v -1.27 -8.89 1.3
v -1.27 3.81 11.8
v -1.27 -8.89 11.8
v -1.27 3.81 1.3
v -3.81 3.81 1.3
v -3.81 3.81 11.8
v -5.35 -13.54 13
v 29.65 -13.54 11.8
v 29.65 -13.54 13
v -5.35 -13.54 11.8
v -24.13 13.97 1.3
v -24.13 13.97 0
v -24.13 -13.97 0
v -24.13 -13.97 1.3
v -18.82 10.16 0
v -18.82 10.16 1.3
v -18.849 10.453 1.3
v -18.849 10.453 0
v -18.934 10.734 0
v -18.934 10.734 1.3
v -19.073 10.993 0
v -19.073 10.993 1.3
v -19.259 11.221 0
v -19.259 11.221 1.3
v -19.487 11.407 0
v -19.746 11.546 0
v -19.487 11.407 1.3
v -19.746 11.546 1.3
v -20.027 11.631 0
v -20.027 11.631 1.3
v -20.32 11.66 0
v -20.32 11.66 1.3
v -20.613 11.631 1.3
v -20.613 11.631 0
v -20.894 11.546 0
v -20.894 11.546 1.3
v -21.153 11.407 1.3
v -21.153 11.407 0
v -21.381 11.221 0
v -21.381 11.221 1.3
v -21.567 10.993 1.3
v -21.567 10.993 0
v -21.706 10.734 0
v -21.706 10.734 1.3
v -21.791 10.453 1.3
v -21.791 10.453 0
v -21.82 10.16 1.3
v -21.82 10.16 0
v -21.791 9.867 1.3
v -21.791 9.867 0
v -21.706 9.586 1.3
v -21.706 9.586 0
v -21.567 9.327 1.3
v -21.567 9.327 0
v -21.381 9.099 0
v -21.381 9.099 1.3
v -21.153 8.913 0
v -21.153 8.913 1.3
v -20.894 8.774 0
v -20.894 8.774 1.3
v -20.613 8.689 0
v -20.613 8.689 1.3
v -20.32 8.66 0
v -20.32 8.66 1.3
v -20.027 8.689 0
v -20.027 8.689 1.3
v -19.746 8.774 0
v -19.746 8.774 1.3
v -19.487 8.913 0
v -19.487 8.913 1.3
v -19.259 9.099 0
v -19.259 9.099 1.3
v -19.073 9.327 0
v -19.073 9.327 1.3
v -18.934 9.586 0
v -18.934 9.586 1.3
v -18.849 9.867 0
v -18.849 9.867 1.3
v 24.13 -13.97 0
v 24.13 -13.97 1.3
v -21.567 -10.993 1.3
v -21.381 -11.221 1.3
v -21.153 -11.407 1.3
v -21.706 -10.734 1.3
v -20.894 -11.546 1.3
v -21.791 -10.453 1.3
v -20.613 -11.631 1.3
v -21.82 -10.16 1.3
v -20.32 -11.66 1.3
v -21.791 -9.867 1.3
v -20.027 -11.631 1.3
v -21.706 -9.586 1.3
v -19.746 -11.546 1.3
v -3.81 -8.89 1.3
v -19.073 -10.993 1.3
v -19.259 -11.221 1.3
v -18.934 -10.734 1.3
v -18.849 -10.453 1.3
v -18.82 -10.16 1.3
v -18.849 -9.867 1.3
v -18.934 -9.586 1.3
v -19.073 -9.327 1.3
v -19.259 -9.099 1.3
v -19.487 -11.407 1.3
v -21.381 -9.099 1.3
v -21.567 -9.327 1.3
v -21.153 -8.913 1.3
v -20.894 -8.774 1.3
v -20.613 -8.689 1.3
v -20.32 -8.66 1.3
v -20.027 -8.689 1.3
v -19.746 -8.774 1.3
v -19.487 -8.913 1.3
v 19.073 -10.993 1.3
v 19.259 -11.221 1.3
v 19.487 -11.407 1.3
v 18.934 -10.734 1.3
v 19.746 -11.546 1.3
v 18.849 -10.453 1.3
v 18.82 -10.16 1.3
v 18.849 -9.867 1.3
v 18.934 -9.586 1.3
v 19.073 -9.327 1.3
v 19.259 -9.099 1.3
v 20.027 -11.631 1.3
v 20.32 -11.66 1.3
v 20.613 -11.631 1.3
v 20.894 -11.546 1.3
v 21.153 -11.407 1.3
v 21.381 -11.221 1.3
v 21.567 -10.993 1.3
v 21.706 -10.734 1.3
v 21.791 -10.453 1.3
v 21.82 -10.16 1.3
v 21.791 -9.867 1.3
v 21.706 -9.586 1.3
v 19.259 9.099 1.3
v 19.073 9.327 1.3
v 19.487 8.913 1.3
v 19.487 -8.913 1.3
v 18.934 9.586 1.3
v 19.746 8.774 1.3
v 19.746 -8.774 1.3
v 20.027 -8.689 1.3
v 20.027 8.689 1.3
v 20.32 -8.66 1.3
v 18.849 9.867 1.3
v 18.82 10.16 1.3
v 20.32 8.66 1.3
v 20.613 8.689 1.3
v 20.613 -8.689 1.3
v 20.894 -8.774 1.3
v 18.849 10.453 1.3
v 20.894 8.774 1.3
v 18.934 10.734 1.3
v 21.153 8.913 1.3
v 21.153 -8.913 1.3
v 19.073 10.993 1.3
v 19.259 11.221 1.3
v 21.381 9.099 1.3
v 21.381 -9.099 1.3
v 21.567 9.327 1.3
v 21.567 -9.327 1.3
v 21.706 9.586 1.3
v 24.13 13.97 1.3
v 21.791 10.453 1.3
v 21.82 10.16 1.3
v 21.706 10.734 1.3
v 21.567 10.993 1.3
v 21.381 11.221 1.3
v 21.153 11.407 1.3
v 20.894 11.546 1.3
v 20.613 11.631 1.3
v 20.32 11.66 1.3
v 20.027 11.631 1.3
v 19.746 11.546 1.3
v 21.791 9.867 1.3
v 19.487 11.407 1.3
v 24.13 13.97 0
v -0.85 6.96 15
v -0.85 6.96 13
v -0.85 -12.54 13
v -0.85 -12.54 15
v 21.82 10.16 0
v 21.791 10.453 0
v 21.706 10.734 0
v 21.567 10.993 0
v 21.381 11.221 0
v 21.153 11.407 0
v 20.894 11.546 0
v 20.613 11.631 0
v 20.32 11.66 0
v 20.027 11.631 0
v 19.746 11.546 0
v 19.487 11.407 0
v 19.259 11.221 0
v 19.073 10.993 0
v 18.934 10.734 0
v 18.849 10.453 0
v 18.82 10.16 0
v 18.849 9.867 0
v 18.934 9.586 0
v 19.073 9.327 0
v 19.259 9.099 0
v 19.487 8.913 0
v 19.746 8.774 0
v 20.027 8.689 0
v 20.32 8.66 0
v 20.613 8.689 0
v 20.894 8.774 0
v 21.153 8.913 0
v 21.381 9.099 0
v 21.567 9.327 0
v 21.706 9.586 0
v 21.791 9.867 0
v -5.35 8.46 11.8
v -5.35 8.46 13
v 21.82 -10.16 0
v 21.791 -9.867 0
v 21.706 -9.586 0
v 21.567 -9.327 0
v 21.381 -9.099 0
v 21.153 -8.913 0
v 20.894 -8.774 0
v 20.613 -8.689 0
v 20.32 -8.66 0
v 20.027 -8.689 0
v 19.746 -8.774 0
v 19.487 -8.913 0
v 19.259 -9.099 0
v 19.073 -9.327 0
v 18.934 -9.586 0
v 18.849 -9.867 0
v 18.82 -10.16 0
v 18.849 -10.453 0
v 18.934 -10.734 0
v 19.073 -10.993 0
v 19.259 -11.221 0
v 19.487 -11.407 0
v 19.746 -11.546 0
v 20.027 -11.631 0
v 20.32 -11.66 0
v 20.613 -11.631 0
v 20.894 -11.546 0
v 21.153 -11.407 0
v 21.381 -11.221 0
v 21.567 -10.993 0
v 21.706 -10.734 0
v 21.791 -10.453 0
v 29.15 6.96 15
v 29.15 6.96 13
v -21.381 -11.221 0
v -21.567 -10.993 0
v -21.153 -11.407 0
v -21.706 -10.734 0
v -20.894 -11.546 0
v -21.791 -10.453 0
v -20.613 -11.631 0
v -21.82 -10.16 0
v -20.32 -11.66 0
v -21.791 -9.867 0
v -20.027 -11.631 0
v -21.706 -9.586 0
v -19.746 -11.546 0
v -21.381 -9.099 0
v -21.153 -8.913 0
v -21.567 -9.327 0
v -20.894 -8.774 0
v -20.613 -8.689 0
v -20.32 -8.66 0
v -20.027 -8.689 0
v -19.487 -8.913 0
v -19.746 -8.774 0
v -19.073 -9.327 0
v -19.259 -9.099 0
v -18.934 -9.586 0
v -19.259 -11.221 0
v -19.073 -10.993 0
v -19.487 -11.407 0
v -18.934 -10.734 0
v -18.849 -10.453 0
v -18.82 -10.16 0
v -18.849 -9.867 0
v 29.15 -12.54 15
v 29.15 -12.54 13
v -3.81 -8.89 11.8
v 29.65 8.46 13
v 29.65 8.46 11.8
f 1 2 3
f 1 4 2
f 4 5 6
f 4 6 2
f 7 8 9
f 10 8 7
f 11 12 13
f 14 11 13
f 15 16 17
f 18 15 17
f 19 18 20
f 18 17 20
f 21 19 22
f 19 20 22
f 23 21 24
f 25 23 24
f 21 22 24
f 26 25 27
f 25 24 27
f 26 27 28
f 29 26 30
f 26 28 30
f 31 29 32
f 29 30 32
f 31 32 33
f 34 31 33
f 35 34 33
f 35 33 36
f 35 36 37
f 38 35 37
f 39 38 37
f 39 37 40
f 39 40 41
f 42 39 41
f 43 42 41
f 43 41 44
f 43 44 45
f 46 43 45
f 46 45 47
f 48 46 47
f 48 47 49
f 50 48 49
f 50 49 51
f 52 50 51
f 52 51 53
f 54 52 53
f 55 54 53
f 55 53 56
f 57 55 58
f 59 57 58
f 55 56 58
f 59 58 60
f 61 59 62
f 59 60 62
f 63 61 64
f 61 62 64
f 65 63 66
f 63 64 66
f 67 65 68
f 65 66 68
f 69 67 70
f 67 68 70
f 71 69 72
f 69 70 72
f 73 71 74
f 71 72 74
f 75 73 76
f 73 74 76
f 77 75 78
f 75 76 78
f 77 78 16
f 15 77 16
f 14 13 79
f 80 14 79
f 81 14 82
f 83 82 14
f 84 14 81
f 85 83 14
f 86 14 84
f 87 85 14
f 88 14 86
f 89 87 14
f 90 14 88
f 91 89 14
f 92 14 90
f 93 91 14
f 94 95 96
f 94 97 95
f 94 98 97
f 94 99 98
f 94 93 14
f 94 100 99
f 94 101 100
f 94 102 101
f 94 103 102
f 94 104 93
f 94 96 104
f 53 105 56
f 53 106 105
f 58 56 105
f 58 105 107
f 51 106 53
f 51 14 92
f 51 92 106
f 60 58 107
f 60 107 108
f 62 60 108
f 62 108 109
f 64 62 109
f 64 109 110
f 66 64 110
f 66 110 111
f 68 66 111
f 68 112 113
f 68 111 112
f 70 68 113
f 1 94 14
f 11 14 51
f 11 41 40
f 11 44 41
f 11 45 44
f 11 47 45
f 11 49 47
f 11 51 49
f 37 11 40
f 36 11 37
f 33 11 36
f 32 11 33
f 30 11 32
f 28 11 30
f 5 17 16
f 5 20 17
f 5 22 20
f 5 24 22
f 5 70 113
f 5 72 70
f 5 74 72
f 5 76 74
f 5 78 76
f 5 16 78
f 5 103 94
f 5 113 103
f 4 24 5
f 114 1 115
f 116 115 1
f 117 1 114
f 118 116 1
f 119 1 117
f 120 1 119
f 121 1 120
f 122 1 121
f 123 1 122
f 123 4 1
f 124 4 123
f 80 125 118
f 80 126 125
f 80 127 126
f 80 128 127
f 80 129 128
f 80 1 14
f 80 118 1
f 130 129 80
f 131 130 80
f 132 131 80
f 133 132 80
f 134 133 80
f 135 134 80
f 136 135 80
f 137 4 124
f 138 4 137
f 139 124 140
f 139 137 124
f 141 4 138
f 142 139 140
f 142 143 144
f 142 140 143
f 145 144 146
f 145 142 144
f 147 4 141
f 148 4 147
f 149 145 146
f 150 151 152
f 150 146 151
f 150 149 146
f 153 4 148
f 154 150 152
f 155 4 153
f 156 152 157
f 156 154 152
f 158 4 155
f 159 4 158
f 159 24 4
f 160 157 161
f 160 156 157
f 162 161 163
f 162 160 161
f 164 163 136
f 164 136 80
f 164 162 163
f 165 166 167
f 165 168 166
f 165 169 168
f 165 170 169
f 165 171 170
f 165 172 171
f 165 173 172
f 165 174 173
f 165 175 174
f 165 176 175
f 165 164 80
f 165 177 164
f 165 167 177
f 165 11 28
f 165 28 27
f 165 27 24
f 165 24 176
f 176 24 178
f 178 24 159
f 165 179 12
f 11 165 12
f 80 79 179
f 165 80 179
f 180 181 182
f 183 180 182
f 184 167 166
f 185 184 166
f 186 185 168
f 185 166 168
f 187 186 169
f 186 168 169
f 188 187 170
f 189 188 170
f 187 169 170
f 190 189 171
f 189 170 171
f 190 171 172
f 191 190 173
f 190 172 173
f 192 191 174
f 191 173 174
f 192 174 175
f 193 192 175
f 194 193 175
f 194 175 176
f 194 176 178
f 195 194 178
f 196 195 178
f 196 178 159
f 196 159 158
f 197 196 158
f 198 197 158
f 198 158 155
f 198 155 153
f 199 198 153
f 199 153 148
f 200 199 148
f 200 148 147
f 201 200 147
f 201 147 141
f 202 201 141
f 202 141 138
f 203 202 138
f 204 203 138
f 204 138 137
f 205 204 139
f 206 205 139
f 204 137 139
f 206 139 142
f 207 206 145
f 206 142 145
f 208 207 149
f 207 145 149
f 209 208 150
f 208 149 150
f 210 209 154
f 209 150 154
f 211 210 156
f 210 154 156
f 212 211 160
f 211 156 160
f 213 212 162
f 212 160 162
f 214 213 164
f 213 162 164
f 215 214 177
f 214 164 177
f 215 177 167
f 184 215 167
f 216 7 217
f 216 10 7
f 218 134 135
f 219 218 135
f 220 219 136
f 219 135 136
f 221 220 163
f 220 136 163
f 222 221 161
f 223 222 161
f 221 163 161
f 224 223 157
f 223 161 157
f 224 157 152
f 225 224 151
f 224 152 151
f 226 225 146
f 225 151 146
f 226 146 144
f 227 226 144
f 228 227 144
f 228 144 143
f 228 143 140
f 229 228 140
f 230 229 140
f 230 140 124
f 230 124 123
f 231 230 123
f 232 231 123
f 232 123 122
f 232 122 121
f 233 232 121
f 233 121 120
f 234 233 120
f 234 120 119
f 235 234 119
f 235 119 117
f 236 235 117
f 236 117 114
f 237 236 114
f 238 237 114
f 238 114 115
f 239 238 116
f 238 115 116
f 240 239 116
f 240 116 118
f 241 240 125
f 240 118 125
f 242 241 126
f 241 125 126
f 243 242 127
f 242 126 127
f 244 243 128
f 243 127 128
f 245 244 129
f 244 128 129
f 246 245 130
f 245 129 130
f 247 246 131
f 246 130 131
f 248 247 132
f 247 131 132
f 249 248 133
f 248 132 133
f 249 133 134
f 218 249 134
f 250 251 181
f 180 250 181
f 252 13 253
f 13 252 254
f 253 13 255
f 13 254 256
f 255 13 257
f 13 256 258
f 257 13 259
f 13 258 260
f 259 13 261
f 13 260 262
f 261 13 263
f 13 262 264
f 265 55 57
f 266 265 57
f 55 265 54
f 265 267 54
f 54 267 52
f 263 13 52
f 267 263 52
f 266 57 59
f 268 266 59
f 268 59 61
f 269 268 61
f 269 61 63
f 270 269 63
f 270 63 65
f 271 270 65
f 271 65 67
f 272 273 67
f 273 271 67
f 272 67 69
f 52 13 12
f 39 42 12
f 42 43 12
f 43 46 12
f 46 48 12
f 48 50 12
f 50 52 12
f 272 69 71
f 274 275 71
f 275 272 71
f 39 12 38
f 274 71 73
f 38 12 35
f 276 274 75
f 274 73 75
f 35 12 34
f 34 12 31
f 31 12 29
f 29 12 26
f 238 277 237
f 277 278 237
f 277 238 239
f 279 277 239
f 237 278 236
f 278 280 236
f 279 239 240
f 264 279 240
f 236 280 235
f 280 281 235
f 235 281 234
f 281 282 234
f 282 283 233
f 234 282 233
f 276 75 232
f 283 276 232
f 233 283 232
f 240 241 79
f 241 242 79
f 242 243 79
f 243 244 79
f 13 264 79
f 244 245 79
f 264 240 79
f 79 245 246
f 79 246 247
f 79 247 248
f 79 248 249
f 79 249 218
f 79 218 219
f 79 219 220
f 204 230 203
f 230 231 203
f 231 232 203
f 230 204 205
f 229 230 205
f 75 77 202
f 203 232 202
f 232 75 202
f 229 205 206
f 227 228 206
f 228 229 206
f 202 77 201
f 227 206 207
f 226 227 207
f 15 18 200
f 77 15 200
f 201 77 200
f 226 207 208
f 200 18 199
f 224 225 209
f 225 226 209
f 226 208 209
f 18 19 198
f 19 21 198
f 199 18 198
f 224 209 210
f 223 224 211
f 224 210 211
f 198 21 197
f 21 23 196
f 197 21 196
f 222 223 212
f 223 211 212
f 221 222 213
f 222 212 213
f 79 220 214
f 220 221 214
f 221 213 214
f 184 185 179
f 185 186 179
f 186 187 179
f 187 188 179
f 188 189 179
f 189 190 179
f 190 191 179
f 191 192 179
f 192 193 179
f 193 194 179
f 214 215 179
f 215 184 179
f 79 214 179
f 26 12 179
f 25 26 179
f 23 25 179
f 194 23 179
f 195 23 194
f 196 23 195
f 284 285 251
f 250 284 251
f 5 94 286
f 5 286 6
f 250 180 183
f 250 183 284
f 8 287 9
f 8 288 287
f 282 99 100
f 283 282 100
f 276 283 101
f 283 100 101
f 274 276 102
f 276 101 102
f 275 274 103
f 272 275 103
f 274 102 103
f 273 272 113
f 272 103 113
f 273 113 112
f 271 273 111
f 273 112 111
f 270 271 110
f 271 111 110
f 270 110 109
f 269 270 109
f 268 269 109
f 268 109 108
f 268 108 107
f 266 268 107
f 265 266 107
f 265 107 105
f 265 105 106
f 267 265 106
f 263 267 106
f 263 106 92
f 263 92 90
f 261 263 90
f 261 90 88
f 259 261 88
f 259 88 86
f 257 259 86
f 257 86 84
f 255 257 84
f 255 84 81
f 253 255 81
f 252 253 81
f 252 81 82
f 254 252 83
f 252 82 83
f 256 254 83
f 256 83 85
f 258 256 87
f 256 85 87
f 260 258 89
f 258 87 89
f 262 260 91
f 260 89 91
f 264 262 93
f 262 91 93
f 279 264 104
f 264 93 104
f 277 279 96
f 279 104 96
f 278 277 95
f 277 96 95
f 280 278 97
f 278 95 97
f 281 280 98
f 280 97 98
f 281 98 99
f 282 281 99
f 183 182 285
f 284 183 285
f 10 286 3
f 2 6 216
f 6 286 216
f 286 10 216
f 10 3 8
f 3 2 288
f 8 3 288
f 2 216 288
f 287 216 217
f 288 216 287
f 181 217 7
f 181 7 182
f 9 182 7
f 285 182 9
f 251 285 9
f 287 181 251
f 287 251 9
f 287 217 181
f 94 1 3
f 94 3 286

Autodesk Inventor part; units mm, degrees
ref_plane "YZ Plane" through (0, 0, 0) normal (1, 0, 0) x (0, 1, 0)
ref_plane "XZ Plane" through (0, 0, 0) normal (0, 1, 0) x (-1, 0, 0)
ref_plane "XY Plane" through (0, 0, 0) normal (0, 0, 1) x (1, 0, 0)
sketch "スケッチ1" plane through (0, 0, 0) normal (0, 0, 1) x (1, 0, 0)
  line L0 (-24.13, -13.97) -> (24.13, -13.97)
  line L1 (24.13, -13.97) -> (24.13, 13.97)
  line L2 (24.13, 13.97) -> (-24.13, 13.97)
  line L3 (-24.13, 13.97) -> (-24.13, -13.97)
  point P0 (0, 0)
  point P1 (0, -13.97)
  point P2 (24.13, 0)
  dimension "d0" = 48.26
  dimension "d1" = 27.94
extrude "押し出し1" add sketch "スケッチ1" along normal blind 1.3
sketch "スケッチ2" plane through (0, 0, 1.3) normal (0, 0, 1) x (1, 0, 0)
  line L0 (-24.13, 13.97) -> (-24.13, -13.97) projected
  line L1 (24.13, 13.97) -> (-24.13, 13.97) projected
  line L2 (-24.13, -13.97) -> (24.13, -13.97) projected
  line L3 (24.13, -13.97) -> (24.13, 13.97) projected
  circle A0 centre (-20.32, 10.16) radius 1.5
  circle A1 centre (-20.32, -10.16) radius 1.5
  circle A2 centre (20.32, -10.16) radius 1.5
  circle A3 centre (20.32, 10.16) radius 1.5
  point P0 (0, 0)
  dimension "d4" = 3.81
  dimension "d5" = 3.81
  dimension "d6" = 3.81
  dimension "d7" = 3.81
  dimension "d8" = 3
extrude "押し出し2" cut sketch "スケッチ2" against normal blind 1.3 contours A0 | A1 | A2 | A3
sketch "スケッチ3" plane through (0, 0, 1.3) normal (0, 0, 1) x (1, 0, 0)
  circle A0 centre (-20.32, -10.16) radius 1.5 projected
  line L0 (-1.27, -8.89) -> (-3.81, -8.89)
  line L1 (-3.81, -8.89) -> (-3.81, 3.81)
  line L2 (-3.81, 3.81) -> (-1.27, 3.81)
  line L3 (-1.27, 3.81) -> (-1.27, -8.89)
  point P0 (0, 0)
  point P1 (-2.54, -7.62)
  point P2 (-2.54, -8.89)
  dimension "d11" = 17.78
  dimension "d12" = 2.54
  dimension "d13" = 2.54
  dimension "d14" = 12.7
  dimension "d15" = 1.27
extrude "押し出し3" add sketch "スケッチ3" along normal blind 8.5 contours L0 L1 L2 L3
sketch "スケッチ4" plane through (0, 0, 9.8) normal (0, 0, 1) x (1, 0, 0)
  line L0 (-3.81, 3.81) -> (-1.27, 3.81)
  line L1 (-1.27, 3.81) -> (-1.27, -8.89)
  line L2 (-1.27, -8.89) -> (-3.81, -8.89)
  line L3 (-3.81, -8.89) -> (-3.81, 3.81)
  point P0 (0, 0)
extrude "押し出し4" add sketch "スケッチ4" along normal blind 2
sketch "スケッチ5" plane through (0, 0, 11.8) normal (0, 0, 1) x (1, 0, 0)
  line L0 (-5.35, 8.46) -> (29.65, 8.46)
  line L1 (29.65, 8.46) -> (29.65, -13.54)
  line L2 (29.65, -13.54) -> (-5.35, -13.54)
  line L3 (-5.35, -13.54) -> (-5.35, 8.46)
  line L4 (-3.81, 3.81) -> (-3.81, -8.89) projected
  point P0 (0, 0)
  point P1 (-5.35, -2.54)
  point P2 (-3.81, -2.54)
  dimension "d20" = 35
  dimension "d21" = 22
  dimension "d22" = 1.54
extrude "押し出し5" add sketch "スケッチ5" along normal blind 1.2
sketch "スケッチ6" plane through (0, 0, 13) normal (0, 0, 1) x (1, 0, 0)
  line L0 (29.15, 6.96) -> (-0.85, 6.96)
  line L1 (-0.85, 6.96) -> (-0.85, -12.54)
  line L2 (-0.85, -12.54) -> (29.15, -12.54)
  line L3 (29.15, -12.54) -> (29.15, 6.96)
  line L4 (29.65, -13.54) -> (29.65, 8.46) projected
  point P0 (0, 0)
  dimension "d25" = 30
  dimension "d26" = 19.5
  dimension "d27" = 0.5
  dimension "d28" = 1
extrude "押し出し6" add sketch "スケッチ6" along normal blind 2
properties part number "LCD-RTC"
